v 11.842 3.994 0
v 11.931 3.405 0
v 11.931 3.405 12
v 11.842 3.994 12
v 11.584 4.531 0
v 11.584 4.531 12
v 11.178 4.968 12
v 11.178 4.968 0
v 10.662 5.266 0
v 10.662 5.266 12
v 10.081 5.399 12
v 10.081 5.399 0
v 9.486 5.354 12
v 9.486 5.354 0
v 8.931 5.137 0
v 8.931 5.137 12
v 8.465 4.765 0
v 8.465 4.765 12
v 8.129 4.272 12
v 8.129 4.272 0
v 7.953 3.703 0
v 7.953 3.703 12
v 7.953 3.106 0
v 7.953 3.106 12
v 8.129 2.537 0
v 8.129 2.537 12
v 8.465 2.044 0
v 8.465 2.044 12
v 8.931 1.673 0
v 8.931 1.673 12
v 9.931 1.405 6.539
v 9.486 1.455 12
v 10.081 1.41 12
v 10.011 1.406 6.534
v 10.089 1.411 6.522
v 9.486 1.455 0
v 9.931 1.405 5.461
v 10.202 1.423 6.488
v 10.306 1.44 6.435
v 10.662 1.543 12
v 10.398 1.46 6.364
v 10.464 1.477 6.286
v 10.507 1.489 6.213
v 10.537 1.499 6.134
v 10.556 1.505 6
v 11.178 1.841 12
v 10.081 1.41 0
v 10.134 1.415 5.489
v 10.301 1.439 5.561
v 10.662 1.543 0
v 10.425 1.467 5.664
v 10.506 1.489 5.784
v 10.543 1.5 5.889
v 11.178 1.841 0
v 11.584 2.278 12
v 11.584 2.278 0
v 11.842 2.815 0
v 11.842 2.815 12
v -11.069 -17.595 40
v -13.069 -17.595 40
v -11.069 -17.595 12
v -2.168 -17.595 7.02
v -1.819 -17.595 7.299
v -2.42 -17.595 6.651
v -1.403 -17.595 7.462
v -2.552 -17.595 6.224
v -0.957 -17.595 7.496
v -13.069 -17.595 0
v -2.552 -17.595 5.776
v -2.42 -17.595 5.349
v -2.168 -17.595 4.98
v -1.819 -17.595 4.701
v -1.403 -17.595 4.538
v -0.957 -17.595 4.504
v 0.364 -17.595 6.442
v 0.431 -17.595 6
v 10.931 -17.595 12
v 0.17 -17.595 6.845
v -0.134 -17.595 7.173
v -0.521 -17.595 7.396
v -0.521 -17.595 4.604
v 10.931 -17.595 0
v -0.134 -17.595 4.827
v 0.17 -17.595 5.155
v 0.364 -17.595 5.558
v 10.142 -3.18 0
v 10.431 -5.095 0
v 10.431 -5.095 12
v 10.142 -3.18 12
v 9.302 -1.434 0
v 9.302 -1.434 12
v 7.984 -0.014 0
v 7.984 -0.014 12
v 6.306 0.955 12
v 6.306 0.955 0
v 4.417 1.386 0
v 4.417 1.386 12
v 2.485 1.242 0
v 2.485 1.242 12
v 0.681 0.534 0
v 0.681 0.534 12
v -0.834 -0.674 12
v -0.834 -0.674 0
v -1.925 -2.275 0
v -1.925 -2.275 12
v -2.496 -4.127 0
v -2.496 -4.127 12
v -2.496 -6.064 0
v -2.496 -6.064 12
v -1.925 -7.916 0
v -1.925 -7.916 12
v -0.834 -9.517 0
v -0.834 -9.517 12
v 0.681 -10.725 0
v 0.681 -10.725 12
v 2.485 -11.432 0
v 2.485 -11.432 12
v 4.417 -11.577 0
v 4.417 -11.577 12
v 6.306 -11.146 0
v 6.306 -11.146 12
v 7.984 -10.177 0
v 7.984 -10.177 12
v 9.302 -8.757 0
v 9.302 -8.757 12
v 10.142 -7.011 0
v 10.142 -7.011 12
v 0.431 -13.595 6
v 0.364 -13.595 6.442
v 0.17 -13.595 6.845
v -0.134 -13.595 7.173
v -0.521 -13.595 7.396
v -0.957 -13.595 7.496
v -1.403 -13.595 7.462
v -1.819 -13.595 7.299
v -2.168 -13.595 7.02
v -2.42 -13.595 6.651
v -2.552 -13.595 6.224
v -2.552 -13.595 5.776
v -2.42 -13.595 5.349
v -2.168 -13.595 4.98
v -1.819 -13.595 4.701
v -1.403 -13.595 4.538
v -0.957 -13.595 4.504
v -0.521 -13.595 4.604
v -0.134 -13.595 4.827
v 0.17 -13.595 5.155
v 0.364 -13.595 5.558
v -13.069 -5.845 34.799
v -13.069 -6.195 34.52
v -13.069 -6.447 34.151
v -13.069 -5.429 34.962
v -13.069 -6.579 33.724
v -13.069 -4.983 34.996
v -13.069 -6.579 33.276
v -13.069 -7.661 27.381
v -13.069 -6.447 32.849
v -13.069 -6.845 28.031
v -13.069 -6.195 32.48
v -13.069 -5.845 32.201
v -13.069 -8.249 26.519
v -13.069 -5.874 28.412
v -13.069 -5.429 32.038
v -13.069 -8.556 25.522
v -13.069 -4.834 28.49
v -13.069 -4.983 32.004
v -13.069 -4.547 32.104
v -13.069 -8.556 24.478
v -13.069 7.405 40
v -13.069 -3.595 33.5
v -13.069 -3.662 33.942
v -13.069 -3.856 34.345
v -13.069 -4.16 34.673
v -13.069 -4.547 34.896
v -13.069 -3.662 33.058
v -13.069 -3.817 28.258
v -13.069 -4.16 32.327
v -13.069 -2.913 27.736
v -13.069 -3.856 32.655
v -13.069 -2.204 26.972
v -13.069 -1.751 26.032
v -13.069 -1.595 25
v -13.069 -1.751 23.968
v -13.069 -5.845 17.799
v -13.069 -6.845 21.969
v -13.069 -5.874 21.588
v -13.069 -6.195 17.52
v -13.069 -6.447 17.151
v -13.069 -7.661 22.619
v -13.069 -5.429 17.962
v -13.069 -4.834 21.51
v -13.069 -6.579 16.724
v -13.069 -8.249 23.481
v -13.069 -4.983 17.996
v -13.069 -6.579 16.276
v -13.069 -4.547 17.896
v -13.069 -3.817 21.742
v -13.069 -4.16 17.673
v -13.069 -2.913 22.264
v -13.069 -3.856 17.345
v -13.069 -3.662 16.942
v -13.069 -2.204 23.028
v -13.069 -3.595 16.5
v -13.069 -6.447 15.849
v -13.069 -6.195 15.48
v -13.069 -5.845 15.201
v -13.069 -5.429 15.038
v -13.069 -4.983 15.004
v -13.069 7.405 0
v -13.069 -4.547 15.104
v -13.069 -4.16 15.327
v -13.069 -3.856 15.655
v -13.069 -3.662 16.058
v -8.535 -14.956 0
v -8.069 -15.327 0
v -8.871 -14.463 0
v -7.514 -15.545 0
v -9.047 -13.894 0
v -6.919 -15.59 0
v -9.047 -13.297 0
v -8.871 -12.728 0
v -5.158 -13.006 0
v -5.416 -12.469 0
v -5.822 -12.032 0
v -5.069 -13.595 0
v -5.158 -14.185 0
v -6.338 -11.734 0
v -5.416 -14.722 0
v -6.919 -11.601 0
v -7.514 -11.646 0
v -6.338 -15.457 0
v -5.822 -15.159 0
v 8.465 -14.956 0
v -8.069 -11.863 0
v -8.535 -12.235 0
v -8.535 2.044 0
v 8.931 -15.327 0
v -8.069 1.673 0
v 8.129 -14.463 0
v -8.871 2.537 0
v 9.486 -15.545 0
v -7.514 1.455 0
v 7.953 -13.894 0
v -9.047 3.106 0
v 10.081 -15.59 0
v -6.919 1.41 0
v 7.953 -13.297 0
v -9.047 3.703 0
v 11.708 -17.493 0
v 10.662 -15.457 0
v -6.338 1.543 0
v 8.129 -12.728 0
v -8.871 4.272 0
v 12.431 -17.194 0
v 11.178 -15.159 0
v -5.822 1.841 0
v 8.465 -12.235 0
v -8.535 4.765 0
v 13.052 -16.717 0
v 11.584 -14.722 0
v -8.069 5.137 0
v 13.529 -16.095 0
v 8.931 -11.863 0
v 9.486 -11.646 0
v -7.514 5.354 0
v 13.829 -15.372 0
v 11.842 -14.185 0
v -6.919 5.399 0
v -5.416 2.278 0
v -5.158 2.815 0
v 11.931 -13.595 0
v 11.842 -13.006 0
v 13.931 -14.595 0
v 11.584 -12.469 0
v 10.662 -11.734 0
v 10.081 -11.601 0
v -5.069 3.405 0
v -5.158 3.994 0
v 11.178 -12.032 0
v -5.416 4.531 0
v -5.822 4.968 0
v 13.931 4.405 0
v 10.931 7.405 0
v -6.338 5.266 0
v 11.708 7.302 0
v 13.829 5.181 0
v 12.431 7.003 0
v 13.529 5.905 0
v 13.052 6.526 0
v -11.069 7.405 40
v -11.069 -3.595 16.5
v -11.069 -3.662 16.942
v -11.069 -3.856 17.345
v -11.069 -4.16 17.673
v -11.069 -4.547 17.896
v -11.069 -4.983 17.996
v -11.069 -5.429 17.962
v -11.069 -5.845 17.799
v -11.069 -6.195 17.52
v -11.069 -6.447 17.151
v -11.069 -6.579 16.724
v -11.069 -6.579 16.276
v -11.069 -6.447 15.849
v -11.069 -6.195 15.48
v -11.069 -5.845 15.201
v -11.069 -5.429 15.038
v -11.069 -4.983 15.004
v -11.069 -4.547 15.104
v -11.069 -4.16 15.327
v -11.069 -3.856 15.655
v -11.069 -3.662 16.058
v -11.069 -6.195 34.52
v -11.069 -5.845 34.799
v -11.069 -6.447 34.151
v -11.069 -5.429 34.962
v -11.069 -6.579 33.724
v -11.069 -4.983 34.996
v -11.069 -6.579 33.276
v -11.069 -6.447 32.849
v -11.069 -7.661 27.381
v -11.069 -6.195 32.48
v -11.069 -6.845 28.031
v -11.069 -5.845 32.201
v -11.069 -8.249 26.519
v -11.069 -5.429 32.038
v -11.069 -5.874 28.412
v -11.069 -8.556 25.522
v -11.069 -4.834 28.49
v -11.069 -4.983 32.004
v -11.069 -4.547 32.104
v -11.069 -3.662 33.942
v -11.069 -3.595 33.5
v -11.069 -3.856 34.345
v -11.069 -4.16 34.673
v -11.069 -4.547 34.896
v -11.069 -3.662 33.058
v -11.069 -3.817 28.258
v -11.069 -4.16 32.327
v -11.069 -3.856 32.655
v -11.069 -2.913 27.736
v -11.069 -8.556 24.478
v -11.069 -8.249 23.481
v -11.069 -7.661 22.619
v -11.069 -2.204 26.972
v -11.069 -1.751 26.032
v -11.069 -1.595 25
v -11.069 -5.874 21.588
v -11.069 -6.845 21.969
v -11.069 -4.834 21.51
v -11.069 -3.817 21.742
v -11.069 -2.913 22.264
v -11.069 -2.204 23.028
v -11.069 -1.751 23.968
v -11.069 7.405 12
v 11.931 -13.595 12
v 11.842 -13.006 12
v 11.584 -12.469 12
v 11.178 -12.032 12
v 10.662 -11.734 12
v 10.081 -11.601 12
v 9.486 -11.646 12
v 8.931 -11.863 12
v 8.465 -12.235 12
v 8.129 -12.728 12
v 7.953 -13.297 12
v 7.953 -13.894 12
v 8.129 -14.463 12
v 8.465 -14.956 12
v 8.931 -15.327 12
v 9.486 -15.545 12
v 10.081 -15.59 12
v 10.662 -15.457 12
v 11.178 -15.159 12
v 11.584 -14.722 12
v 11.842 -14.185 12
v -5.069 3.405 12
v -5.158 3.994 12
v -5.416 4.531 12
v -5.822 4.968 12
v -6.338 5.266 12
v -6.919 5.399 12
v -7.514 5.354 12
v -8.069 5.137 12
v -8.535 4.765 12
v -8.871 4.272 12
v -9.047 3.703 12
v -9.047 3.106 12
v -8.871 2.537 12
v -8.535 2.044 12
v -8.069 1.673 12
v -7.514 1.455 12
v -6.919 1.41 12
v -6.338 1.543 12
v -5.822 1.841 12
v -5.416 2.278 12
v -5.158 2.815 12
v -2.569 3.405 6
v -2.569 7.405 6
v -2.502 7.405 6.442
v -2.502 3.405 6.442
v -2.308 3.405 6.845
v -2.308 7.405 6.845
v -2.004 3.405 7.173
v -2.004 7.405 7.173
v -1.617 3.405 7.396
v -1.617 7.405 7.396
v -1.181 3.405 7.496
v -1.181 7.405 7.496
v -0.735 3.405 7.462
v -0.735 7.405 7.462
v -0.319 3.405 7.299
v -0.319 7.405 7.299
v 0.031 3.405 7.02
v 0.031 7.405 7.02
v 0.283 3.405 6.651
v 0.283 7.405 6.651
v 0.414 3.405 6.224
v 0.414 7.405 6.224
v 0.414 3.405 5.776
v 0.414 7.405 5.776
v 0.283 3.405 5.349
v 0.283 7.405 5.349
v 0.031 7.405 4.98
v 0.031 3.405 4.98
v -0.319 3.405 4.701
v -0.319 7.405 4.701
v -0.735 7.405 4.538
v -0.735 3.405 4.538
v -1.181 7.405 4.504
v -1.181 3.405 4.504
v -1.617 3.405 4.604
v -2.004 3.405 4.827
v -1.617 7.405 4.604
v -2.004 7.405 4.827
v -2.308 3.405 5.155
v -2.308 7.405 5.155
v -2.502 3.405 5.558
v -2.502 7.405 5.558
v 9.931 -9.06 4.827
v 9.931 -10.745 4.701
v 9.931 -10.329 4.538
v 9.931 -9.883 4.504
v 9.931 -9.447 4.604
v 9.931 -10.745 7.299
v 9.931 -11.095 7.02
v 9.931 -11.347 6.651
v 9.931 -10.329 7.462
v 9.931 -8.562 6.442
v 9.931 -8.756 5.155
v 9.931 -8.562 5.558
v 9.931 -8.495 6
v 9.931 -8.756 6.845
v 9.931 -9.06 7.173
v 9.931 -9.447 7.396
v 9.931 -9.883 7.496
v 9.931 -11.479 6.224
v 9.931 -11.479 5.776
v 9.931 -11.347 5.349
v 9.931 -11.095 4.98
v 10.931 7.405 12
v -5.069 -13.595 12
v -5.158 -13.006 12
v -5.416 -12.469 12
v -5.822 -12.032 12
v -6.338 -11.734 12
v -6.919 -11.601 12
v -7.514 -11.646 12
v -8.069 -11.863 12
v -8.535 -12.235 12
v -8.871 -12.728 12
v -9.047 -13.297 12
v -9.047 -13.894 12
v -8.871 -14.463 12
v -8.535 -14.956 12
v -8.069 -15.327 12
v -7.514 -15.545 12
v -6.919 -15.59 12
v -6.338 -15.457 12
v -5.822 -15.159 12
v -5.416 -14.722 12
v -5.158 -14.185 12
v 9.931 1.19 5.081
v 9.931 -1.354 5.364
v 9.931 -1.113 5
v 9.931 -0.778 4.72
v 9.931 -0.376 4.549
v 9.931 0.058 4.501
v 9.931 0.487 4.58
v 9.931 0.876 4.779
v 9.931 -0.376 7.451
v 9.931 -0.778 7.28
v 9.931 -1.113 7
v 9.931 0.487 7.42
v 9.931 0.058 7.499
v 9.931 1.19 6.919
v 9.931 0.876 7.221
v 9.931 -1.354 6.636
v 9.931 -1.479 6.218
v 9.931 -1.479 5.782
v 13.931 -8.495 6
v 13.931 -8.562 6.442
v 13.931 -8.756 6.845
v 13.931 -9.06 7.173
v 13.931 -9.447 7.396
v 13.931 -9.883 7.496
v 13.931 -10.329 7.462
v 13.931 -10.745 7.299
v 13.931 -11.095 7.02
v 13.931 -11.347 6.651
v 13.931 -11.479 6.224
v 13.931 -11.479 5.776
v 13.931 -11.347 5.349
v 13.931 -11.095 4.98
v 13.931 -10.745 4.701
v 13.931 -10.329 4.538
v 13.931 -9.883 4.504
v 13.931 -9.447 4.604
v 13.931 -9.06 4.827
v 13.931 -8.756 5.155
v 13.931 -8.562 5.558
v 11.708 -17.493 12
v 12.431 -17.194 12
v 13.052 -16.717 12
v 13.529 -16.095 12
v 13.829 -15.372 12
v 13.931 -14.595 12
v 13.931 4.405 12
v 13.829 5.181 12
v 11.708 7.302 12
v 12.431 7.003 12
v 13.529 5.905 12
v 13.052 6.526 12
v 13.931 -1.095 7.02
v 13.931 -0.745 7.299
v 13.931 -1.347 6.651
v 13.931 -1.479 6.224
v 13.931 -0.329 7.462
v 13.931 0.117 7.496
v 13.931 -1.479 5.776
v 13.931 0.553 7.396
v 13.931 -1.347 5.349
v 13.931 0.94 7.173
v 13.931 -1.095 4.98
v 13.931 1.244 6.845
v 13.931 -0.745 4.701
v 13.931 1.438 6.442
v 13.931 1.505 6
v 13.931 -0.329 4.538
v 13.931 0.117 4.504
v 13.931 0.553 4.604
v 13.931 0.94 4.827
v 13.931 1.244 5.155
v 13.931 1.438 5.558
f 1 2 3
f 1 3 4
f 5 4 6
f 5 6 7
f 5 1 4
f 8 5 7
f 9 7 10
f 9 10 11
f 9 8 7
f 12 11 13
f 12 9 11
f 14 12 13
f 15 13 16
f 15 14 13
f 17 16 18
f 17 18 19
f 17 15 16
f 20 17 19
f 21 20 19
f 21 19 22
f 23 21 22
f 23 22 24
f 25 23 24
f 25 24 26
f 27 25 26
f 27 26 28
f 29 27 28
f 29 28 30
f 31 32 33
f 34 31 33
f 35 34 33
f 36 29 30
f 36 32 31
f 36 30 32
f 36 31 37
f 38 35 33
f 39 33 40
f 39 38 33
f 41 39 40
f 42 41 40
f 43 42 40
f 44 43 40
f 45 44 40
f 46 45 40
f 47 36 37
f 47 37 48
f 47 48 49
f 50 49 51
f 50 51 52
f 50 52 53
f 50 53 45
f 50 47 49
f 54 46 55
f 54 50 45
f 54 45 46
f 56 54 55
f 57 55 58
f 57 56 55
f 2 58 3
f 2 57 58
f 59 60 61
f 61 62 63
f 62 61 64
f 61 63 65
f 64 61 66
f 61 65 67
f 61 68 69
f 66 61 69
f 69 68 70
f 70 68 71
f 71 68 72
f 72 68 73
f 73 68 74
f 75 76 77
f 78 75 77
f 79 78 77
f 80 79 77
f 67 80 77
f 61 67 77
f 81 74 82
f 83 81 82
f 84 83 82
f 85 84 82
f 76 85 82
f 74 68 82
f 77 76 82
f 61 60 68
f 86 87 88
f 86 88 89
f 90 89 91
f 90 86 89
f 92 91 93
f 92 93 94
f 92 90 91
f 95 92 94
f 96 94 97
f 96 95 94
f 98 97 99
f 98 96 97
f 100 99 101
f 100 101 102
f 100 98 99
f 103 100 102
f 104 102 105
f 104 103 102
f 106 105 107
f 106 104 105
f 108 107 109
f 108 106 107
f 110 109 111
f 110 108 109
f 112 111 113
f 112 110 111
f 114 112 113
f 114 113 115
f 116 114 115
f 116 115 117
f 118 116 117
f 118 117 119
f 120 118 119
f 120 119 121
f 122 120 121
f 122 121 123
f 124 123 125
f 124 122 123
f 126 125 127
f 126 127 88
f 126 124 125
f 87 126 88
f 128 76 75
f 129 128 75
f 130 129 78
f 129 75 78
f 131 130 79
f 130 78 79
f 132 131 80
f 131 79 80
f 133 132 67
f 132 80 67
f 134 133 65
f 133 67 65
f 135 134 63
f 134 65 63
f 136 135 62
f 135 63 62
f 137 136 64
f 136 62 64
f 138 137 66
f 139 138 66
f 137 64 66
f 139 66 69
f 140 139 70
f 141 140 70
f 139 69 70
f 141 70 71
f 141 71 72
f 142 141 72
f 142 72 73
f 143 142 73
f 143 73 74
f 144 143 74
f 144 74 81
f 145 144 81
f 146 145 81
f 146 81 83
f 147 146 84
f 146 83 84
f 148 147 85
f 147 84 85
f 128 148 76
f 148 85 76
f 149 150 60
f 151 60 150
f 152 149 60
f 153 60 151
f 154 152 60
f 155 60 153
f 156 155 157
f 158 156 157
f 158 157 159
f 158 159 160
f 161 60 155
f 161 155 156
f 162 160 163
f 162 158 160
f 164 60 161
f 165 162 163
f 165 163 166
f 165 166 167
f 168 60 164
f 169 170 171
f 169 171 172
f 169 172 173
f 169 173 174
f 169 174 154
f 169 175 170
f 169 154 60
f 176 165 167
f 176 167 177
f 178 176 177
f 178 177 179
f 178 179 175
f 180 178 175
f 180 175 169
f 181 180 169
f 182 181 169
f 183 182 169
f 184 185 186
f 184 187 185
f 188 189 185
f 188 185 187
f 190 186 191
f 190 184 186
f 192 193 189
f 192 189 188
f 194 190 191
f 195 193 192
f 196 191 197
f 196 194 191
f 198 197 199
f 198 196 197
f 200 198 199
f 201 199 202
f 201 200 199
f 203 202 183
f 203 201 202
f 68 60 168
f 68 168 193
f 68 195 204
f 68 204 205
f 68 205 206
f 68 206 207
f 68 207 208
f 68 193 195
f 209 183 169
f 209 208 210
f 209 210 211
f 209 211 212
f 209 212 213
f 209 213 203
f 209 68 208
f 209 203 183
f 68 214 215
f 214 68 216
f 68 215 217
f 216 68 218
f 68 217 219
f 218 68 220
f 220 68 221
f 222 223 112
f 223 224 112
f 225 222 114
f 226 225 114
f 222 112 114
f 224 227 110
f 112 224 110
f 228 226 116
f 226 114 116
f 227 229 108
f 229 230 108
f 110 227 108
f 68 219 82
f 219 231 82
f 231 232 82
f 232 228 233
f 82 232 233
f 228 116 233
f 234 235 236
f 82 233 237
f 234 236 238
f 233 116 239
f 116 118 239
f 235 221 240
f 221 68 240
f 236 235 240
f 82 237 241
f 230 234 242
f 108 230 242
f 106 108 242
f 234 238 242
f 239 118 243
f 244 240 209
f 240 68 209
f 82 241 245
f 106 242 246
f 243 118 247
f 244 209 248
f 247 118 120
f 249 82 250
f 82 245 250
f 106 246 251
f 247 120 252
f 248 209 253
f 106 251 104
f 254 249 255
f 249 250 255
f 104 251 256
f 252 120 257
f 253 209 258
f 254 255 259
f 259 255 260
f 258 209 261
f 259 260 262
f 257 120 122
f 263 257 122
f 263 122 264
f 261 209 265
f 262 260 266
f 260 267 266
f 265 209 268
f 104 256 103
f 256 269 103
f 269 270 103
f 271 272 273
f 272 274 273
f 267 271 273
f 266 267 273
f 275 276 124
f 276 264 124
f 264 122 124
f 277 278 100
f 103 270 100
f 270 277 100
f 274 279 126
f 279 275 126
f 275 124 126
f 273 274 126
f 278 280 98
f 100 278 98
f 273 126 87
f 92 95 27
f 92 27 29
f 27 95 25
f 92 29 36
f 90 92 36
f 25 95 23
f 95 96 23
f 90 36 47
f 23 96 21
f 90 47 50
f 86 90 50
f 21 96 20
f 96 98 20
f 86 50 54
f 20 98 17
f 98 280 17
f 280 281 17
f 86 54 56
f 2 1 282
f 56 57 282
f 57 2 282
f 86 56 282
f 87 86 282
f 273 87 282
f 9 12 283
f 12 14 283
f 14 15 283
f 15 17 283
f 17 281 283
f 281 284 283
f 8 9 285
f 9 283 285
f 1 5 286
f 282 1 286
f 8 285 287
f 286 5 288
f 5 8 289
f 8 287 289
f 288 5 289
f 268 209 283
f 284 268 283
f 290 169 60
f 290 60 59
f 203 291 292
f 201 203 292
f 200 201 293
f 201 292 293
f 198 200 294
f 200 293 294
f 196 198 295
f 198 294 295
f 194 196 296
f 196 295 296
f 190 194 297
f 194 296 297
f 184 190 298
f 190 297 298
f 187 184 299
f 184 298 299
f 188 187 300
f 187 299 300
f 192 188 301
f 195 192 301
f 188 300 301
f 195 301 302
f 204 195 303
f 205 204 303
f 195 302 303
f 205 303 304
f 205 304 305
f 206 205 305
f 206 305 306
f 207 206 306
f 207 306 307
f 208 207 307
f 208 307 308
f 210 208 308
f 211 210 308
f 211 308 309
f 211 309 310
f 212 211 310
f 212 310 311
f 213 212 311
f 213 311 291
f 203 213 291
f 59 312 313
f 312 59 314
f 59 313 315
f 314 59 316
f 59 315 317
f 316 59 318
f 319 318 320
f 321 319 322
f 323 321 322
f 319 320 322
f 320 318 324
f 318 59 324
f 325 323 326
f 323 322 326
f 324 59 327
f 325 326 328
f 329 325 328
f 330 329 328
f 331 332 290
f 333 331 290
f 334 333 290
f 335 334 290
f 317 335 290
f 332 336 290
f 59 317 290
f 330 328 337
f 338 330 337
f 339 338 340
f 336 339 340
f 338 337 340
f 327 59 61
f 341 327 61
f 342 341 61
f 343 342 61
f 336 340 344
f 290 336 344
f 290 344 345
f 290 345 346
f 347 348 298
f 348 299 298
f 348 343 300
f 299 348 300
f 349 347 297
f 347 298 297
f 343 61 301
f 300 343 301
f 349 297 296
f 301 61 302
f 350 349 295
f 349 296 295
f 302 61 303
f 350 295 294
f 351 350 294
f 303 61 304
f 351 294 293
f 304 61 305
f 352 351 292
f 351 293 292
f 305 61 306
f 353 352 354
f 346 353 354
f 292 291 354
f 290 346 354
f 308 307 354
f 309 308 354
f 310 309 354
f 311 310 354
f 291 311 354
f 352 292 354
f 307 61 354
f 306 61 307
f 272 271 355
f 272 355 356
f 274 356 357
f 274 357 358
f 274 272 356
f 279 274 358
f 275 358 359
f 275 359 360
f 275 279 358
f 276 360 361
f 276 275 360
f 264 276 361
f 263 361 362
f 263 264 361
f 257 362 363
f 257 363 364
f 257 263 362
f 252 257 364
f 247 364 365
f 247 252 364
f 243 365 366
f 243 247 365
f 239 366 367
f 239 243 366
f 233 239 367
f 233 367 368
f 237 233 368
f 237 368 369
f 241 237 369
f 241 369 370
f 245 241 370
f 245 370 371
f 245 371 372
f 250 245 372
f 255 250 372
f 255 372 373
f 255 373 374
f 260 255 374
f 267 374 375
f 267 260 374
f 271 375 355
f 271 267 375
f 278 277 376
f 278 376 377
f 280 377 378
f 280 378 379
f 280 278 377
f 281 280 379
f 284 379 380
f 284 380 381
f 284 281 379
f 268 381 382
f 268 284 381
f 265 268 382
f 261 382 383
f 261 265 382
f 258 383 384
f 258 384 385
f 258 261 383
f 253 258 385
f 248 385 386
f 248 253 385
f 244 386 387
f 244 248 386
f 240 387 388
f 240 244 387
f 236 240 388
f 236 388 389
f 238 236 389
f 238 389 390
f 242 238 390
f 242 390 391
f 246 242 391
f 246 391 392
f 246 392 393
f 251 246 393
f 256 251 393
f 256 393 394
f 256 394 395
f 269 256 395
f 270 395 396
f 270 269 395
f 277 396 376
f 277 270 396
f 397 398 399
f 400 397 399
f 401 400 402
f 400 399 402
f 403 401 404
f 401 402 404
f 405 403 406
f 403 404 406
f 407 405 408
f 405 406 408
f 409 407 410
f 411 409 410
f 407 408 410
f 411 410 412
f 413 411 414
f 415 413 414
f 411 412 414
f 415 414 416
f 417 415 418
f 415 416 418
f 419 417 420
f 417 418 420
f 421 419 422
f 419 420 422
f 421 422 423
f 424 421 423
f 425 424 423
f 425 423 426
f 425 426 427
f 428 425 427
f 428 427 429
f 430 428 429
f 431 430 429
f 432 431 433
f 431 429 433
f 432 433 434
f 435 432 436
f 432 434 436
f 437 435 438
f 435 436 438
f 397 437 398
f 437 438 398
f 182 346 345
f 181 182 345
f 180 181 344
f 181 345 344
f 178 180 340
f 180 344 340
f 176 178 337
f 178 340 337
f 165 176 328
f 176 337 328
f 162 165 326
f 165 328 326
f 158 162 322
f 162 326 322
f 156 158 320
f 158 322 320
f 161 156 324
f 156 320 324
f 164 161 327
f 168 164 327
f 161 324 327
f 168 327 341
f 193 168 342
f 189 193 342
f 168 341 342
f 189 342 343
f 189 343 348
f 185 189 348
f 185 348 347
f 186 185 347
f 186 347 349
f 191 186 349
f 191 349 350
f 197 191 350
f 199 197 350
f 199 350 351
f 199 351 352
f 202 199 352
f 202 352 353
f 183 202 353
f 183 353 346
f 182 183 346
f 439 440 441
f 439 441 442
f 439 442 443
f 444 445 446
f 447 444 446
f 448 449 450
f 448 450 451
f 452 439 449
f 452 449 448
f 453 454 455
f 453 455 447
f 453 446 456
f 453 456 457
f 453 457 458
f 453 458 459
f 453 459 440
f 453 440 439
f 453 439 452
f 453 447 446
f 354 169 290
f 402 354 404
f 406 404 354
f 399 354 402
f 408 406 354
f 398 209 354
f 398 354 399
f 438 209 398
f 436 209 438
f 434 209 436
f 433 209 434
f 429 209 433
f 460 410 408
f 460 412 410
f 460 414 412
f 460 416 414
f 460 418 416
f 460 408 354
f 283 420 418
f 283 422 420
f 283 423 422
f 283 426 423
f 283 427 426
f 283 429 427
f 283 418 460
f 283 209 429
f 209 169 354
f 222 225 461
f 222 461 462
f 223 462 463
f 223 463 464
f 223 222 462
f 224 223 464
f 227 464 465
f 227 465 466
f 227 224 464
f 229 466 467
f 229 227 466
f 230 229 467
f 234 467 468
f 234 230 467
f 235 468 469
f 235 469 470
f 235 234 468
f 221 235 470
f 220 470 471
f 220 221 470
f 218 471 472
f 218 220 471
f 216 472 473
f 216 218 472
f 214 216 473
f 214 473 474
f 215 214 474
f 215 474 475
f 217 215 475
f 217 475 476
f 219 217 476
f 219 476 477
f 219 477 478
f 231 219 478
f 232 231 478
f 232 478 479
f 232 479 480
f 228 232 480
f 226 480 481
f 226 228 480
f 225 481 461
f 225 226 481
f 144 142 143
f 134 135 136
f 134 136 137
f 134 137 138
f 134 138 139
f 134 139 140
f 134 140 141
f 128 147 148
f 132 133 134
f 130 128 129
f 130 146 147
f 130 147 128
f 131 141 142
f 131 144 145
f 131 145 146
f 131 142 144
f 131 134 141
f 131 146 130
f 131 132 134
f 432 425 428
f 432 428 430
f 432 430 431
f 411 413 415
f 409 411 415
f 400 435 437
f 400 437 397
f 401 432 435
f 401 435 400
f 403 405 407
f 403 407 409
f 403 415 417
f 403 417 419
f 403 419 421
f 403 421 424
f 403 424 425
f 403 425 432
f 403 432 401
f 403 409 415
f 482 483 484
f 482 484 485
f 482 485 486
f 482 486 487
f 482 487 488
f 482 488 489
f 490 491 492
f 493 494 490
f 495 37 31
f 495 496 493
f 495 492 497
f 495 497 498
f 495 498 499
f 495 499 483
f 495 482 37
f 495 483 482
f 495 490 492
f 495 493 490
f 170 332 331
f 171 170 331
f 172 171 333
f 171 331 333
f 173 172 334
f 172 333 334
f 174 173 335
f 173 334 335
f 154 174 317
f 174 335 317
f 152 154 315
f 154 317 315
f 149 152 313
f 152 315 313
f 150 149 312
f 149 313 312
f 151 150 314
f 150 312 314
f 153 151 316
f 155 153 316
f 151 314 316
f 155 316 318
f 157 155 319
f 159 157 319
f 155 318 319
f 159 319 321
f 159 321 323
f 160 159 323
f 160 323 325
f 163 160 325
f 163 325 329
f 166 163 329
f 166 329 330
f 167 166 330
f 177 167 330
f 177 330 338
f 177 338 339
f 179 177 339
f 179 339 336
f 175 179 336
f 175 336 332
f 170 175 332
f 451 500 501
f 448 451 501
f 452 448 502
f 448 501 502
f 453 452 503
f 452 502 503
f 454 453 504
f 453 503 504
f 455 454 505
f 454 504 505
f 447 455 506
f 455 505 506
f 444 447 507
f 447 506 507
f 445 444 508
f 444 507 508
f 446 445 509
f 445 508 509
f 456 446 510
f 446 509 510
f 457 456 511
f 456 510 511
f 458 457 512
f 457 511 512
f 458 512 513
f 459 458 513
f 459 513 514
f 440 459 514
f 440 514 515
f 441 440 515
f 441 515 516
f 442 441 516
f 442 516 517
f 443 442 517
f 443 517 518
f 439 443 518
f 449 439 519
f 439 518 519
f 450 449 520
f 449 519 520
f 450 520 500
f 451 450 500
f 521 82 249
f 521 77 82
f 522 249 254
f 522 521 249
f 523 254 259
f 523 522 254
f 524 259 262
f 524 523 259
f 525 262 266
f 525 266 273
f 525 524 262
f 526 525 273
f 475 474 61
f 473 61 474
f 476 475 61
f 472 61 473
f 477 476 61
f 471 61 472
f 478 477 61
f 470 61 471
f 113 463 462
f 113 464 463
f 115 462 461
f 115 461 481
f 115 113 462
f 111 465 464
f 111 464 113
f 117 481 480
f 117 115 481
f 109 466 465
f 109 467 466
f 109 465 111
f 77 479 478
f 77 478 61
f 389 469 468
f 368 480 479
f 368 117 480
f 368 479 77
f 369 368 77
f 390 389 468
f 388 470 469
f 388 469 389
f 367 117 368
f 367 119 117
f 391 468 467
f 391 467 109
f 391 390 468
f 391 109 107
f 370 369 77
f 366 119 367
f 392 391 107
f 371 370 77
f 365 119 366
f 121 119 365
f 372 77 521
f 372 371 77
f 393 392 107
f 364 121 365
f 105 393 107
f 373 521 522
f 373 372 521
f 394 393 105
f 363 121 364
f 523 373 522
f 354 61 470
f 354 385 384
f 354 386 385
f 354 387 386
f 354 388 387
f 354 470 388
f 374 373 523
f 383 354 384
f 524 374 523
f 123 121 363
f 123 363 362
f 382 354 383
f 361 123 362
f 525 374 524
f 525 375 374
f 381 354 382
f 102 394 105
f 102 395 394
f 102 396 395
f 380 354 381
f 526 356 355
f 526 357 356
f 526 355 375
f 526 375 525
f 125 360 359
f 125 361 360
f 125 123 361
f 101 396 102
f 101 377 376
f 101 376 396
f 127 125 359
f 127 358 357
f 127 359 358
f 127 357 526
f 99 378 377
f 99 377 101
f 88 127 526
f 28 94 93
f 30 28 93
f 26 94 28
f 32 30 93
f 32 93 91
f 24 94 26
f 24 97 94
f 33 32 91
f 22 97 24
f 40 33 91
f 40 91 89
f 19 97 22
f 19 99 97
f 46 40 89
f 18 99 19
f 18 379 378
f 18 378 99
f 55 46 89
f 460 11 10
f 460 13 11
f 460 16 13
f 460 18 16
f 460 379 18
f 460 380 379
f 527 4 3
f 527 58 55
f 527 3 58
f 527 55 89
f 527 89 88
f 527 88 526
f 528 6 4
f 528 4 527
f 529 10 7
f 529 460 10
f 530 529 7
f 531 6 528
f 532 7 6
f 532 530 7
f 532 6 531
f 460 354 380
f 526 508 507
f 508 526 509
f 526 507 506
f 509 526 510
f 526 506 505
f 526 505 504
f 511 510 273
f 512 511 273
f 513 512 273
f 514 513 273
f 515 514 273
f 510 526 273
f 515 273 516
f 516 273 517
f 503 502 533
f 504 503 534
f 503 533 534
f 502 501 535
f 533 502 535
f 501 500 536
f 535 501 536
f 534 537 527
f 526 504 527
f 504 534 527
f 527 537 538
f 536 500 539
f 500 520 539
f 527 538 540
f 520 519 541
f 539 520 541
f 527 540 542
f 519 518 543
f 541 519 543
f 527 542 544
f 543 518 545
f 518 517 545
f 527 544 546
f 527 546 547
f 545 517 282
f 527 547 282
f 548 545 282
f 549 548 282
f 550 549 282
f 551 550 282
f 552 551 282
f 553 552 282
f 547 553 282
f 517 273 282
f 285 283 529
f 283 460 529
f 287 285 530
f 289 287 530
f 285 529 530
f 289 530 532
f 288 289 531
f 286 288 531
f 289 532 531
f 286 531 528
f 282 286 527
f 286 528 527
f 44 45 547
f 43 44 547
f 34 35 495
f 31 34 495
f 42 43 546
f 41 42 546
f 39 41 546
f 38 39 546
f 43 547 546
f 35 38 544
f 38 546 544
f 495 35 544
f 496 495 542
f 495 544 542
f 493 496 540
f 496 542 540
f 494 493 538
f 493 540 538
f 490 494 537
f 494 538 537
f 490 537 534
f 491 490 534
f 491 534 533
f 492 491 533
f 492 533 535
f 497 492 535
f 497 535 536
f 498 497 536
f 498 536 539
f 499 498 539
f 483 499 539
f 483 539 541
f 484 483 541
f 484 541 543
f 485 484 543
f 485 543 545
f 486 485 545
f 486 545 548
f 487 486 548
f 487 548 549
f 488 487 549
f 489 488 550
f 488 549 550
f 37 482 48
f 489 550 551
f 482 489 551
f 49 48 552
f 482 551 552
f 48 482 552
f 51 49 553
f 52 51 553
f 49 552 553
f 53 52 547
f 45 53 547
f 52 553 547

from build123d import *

# Parameters (mm, degrees)
F0_W           = 27
F0_H           = 25
F0_R           = 2
F0_R_2         = 6.5
F1_DEPTH       = 12
F2_W           = 2
F2_H           = 25
F3_DEPTH       = 28
F4_R           = 1.5
F5_DEPTH       = 4
F6_R           = 1.5
F7_DEPTH       = 4
F8_R           = 1.5
F9_DEPTH       = 4
F10_R          = 3
F11_R          = 3.5
F11_R_2        = 1.5
F12_DEPTH      = 25
F12_DEPTH_BACK = 25


with BuildPart() as f1:
    # F0 (on Top) → F1 (new body)
    with BuildSketch(Plane.XY):
        with Locations((0.431113, -5.095445)):
            Rectangle(F0_W, F0_H)
        with Locations((-7.068887, -13.595445)):
            Circle(F0_R, mode=Mode.SUBTRACT)
        with Locations((9.931113, -13.595445)):
            Circle(F0_R, mode=Mode.SUBTRACT)
        with Locations((-7.068887, 3.404555)):
            Circle(F0_R, mode=Mode.SUBTRACT)
        with Locations((3.931113, -5.095445)):
            Circle(F0_R_2, mode=Mode.SUBTRACT)
        with Locations((9.931113, 3.404555)):
            Circle(F0_R, mode=Mode.SUBTRACT)
    extrude(amount=F1_DEPTH)

    # F2 (on face) → F3 (join)
    with BuildSketch(Plane.XY.offset(12)):
        with Locations((-12.068887, -5.095445)):
            Rectangle(F2_W, F2_H)
    extrude(amount=F3_DEPTH)

    # F4 (on face) → F5 (cut)
    with BuildSketch(Plane.YZ.offset(13.931113)):
        with Locations((-9.995445, 6)):
            Circle(F4_R)
        with Locations((0.004555, 6)):
            Circle(F4_R)
    extrude(amount=-F5_DEPTH, mode=Mode.SUBTRACT)

    # F6 (on face) → F7 (cut)
    with BuildSketch(Plane.XZ.offset(17.595445)):
        with Locations((-1.068887, 6)):
            Circle(F6_R)
    extrude(amount=-F7_DEPTH, mode=Mode.SUBTRACT)

    # F8 (on face) → F9 (cut)
    with BuildSketch(Plane(origin=(0, 7.404555, 0), x_dir=(-1, 0, 0), z_dir=(0, 1, 0))):
        with Locations((1.068887, 6)):
            Circle(F8_R)
    extrude(amount=-F9_DEPTH, mode=Mode.SUBTRACT)

    # F10
    f10_edges = [f1.edges().sort_by_distance(p)[0] for p in [
        (13.931113, -17.595445, 6),
        (13.931113, 7.404555, 6),
    ]]
    fillet(f10_edges, radius=F10_R)

    # F11 (on face) → F12 (cut, two sides)
    with BuildSketch(Plane.YZ.offset(-11.068887)) as f12_sk:
        with Locations((-5.095445, 25)):
            Circle(F11_R)
        with Locations((-5.095445, 33.5)):
            Circle(F11_R_2)
        with Locations((-5.095445, 16.5)):
            Circle(F11_R_2)
    extrude(amount=-F12_DEPTH, mode=Mode.SUBTRACT)
    extrude(f12_sk.sketch, amount=-F12_DEPTH_BACK, mode=Mode.SUBTRACT)


solid = f1.part
